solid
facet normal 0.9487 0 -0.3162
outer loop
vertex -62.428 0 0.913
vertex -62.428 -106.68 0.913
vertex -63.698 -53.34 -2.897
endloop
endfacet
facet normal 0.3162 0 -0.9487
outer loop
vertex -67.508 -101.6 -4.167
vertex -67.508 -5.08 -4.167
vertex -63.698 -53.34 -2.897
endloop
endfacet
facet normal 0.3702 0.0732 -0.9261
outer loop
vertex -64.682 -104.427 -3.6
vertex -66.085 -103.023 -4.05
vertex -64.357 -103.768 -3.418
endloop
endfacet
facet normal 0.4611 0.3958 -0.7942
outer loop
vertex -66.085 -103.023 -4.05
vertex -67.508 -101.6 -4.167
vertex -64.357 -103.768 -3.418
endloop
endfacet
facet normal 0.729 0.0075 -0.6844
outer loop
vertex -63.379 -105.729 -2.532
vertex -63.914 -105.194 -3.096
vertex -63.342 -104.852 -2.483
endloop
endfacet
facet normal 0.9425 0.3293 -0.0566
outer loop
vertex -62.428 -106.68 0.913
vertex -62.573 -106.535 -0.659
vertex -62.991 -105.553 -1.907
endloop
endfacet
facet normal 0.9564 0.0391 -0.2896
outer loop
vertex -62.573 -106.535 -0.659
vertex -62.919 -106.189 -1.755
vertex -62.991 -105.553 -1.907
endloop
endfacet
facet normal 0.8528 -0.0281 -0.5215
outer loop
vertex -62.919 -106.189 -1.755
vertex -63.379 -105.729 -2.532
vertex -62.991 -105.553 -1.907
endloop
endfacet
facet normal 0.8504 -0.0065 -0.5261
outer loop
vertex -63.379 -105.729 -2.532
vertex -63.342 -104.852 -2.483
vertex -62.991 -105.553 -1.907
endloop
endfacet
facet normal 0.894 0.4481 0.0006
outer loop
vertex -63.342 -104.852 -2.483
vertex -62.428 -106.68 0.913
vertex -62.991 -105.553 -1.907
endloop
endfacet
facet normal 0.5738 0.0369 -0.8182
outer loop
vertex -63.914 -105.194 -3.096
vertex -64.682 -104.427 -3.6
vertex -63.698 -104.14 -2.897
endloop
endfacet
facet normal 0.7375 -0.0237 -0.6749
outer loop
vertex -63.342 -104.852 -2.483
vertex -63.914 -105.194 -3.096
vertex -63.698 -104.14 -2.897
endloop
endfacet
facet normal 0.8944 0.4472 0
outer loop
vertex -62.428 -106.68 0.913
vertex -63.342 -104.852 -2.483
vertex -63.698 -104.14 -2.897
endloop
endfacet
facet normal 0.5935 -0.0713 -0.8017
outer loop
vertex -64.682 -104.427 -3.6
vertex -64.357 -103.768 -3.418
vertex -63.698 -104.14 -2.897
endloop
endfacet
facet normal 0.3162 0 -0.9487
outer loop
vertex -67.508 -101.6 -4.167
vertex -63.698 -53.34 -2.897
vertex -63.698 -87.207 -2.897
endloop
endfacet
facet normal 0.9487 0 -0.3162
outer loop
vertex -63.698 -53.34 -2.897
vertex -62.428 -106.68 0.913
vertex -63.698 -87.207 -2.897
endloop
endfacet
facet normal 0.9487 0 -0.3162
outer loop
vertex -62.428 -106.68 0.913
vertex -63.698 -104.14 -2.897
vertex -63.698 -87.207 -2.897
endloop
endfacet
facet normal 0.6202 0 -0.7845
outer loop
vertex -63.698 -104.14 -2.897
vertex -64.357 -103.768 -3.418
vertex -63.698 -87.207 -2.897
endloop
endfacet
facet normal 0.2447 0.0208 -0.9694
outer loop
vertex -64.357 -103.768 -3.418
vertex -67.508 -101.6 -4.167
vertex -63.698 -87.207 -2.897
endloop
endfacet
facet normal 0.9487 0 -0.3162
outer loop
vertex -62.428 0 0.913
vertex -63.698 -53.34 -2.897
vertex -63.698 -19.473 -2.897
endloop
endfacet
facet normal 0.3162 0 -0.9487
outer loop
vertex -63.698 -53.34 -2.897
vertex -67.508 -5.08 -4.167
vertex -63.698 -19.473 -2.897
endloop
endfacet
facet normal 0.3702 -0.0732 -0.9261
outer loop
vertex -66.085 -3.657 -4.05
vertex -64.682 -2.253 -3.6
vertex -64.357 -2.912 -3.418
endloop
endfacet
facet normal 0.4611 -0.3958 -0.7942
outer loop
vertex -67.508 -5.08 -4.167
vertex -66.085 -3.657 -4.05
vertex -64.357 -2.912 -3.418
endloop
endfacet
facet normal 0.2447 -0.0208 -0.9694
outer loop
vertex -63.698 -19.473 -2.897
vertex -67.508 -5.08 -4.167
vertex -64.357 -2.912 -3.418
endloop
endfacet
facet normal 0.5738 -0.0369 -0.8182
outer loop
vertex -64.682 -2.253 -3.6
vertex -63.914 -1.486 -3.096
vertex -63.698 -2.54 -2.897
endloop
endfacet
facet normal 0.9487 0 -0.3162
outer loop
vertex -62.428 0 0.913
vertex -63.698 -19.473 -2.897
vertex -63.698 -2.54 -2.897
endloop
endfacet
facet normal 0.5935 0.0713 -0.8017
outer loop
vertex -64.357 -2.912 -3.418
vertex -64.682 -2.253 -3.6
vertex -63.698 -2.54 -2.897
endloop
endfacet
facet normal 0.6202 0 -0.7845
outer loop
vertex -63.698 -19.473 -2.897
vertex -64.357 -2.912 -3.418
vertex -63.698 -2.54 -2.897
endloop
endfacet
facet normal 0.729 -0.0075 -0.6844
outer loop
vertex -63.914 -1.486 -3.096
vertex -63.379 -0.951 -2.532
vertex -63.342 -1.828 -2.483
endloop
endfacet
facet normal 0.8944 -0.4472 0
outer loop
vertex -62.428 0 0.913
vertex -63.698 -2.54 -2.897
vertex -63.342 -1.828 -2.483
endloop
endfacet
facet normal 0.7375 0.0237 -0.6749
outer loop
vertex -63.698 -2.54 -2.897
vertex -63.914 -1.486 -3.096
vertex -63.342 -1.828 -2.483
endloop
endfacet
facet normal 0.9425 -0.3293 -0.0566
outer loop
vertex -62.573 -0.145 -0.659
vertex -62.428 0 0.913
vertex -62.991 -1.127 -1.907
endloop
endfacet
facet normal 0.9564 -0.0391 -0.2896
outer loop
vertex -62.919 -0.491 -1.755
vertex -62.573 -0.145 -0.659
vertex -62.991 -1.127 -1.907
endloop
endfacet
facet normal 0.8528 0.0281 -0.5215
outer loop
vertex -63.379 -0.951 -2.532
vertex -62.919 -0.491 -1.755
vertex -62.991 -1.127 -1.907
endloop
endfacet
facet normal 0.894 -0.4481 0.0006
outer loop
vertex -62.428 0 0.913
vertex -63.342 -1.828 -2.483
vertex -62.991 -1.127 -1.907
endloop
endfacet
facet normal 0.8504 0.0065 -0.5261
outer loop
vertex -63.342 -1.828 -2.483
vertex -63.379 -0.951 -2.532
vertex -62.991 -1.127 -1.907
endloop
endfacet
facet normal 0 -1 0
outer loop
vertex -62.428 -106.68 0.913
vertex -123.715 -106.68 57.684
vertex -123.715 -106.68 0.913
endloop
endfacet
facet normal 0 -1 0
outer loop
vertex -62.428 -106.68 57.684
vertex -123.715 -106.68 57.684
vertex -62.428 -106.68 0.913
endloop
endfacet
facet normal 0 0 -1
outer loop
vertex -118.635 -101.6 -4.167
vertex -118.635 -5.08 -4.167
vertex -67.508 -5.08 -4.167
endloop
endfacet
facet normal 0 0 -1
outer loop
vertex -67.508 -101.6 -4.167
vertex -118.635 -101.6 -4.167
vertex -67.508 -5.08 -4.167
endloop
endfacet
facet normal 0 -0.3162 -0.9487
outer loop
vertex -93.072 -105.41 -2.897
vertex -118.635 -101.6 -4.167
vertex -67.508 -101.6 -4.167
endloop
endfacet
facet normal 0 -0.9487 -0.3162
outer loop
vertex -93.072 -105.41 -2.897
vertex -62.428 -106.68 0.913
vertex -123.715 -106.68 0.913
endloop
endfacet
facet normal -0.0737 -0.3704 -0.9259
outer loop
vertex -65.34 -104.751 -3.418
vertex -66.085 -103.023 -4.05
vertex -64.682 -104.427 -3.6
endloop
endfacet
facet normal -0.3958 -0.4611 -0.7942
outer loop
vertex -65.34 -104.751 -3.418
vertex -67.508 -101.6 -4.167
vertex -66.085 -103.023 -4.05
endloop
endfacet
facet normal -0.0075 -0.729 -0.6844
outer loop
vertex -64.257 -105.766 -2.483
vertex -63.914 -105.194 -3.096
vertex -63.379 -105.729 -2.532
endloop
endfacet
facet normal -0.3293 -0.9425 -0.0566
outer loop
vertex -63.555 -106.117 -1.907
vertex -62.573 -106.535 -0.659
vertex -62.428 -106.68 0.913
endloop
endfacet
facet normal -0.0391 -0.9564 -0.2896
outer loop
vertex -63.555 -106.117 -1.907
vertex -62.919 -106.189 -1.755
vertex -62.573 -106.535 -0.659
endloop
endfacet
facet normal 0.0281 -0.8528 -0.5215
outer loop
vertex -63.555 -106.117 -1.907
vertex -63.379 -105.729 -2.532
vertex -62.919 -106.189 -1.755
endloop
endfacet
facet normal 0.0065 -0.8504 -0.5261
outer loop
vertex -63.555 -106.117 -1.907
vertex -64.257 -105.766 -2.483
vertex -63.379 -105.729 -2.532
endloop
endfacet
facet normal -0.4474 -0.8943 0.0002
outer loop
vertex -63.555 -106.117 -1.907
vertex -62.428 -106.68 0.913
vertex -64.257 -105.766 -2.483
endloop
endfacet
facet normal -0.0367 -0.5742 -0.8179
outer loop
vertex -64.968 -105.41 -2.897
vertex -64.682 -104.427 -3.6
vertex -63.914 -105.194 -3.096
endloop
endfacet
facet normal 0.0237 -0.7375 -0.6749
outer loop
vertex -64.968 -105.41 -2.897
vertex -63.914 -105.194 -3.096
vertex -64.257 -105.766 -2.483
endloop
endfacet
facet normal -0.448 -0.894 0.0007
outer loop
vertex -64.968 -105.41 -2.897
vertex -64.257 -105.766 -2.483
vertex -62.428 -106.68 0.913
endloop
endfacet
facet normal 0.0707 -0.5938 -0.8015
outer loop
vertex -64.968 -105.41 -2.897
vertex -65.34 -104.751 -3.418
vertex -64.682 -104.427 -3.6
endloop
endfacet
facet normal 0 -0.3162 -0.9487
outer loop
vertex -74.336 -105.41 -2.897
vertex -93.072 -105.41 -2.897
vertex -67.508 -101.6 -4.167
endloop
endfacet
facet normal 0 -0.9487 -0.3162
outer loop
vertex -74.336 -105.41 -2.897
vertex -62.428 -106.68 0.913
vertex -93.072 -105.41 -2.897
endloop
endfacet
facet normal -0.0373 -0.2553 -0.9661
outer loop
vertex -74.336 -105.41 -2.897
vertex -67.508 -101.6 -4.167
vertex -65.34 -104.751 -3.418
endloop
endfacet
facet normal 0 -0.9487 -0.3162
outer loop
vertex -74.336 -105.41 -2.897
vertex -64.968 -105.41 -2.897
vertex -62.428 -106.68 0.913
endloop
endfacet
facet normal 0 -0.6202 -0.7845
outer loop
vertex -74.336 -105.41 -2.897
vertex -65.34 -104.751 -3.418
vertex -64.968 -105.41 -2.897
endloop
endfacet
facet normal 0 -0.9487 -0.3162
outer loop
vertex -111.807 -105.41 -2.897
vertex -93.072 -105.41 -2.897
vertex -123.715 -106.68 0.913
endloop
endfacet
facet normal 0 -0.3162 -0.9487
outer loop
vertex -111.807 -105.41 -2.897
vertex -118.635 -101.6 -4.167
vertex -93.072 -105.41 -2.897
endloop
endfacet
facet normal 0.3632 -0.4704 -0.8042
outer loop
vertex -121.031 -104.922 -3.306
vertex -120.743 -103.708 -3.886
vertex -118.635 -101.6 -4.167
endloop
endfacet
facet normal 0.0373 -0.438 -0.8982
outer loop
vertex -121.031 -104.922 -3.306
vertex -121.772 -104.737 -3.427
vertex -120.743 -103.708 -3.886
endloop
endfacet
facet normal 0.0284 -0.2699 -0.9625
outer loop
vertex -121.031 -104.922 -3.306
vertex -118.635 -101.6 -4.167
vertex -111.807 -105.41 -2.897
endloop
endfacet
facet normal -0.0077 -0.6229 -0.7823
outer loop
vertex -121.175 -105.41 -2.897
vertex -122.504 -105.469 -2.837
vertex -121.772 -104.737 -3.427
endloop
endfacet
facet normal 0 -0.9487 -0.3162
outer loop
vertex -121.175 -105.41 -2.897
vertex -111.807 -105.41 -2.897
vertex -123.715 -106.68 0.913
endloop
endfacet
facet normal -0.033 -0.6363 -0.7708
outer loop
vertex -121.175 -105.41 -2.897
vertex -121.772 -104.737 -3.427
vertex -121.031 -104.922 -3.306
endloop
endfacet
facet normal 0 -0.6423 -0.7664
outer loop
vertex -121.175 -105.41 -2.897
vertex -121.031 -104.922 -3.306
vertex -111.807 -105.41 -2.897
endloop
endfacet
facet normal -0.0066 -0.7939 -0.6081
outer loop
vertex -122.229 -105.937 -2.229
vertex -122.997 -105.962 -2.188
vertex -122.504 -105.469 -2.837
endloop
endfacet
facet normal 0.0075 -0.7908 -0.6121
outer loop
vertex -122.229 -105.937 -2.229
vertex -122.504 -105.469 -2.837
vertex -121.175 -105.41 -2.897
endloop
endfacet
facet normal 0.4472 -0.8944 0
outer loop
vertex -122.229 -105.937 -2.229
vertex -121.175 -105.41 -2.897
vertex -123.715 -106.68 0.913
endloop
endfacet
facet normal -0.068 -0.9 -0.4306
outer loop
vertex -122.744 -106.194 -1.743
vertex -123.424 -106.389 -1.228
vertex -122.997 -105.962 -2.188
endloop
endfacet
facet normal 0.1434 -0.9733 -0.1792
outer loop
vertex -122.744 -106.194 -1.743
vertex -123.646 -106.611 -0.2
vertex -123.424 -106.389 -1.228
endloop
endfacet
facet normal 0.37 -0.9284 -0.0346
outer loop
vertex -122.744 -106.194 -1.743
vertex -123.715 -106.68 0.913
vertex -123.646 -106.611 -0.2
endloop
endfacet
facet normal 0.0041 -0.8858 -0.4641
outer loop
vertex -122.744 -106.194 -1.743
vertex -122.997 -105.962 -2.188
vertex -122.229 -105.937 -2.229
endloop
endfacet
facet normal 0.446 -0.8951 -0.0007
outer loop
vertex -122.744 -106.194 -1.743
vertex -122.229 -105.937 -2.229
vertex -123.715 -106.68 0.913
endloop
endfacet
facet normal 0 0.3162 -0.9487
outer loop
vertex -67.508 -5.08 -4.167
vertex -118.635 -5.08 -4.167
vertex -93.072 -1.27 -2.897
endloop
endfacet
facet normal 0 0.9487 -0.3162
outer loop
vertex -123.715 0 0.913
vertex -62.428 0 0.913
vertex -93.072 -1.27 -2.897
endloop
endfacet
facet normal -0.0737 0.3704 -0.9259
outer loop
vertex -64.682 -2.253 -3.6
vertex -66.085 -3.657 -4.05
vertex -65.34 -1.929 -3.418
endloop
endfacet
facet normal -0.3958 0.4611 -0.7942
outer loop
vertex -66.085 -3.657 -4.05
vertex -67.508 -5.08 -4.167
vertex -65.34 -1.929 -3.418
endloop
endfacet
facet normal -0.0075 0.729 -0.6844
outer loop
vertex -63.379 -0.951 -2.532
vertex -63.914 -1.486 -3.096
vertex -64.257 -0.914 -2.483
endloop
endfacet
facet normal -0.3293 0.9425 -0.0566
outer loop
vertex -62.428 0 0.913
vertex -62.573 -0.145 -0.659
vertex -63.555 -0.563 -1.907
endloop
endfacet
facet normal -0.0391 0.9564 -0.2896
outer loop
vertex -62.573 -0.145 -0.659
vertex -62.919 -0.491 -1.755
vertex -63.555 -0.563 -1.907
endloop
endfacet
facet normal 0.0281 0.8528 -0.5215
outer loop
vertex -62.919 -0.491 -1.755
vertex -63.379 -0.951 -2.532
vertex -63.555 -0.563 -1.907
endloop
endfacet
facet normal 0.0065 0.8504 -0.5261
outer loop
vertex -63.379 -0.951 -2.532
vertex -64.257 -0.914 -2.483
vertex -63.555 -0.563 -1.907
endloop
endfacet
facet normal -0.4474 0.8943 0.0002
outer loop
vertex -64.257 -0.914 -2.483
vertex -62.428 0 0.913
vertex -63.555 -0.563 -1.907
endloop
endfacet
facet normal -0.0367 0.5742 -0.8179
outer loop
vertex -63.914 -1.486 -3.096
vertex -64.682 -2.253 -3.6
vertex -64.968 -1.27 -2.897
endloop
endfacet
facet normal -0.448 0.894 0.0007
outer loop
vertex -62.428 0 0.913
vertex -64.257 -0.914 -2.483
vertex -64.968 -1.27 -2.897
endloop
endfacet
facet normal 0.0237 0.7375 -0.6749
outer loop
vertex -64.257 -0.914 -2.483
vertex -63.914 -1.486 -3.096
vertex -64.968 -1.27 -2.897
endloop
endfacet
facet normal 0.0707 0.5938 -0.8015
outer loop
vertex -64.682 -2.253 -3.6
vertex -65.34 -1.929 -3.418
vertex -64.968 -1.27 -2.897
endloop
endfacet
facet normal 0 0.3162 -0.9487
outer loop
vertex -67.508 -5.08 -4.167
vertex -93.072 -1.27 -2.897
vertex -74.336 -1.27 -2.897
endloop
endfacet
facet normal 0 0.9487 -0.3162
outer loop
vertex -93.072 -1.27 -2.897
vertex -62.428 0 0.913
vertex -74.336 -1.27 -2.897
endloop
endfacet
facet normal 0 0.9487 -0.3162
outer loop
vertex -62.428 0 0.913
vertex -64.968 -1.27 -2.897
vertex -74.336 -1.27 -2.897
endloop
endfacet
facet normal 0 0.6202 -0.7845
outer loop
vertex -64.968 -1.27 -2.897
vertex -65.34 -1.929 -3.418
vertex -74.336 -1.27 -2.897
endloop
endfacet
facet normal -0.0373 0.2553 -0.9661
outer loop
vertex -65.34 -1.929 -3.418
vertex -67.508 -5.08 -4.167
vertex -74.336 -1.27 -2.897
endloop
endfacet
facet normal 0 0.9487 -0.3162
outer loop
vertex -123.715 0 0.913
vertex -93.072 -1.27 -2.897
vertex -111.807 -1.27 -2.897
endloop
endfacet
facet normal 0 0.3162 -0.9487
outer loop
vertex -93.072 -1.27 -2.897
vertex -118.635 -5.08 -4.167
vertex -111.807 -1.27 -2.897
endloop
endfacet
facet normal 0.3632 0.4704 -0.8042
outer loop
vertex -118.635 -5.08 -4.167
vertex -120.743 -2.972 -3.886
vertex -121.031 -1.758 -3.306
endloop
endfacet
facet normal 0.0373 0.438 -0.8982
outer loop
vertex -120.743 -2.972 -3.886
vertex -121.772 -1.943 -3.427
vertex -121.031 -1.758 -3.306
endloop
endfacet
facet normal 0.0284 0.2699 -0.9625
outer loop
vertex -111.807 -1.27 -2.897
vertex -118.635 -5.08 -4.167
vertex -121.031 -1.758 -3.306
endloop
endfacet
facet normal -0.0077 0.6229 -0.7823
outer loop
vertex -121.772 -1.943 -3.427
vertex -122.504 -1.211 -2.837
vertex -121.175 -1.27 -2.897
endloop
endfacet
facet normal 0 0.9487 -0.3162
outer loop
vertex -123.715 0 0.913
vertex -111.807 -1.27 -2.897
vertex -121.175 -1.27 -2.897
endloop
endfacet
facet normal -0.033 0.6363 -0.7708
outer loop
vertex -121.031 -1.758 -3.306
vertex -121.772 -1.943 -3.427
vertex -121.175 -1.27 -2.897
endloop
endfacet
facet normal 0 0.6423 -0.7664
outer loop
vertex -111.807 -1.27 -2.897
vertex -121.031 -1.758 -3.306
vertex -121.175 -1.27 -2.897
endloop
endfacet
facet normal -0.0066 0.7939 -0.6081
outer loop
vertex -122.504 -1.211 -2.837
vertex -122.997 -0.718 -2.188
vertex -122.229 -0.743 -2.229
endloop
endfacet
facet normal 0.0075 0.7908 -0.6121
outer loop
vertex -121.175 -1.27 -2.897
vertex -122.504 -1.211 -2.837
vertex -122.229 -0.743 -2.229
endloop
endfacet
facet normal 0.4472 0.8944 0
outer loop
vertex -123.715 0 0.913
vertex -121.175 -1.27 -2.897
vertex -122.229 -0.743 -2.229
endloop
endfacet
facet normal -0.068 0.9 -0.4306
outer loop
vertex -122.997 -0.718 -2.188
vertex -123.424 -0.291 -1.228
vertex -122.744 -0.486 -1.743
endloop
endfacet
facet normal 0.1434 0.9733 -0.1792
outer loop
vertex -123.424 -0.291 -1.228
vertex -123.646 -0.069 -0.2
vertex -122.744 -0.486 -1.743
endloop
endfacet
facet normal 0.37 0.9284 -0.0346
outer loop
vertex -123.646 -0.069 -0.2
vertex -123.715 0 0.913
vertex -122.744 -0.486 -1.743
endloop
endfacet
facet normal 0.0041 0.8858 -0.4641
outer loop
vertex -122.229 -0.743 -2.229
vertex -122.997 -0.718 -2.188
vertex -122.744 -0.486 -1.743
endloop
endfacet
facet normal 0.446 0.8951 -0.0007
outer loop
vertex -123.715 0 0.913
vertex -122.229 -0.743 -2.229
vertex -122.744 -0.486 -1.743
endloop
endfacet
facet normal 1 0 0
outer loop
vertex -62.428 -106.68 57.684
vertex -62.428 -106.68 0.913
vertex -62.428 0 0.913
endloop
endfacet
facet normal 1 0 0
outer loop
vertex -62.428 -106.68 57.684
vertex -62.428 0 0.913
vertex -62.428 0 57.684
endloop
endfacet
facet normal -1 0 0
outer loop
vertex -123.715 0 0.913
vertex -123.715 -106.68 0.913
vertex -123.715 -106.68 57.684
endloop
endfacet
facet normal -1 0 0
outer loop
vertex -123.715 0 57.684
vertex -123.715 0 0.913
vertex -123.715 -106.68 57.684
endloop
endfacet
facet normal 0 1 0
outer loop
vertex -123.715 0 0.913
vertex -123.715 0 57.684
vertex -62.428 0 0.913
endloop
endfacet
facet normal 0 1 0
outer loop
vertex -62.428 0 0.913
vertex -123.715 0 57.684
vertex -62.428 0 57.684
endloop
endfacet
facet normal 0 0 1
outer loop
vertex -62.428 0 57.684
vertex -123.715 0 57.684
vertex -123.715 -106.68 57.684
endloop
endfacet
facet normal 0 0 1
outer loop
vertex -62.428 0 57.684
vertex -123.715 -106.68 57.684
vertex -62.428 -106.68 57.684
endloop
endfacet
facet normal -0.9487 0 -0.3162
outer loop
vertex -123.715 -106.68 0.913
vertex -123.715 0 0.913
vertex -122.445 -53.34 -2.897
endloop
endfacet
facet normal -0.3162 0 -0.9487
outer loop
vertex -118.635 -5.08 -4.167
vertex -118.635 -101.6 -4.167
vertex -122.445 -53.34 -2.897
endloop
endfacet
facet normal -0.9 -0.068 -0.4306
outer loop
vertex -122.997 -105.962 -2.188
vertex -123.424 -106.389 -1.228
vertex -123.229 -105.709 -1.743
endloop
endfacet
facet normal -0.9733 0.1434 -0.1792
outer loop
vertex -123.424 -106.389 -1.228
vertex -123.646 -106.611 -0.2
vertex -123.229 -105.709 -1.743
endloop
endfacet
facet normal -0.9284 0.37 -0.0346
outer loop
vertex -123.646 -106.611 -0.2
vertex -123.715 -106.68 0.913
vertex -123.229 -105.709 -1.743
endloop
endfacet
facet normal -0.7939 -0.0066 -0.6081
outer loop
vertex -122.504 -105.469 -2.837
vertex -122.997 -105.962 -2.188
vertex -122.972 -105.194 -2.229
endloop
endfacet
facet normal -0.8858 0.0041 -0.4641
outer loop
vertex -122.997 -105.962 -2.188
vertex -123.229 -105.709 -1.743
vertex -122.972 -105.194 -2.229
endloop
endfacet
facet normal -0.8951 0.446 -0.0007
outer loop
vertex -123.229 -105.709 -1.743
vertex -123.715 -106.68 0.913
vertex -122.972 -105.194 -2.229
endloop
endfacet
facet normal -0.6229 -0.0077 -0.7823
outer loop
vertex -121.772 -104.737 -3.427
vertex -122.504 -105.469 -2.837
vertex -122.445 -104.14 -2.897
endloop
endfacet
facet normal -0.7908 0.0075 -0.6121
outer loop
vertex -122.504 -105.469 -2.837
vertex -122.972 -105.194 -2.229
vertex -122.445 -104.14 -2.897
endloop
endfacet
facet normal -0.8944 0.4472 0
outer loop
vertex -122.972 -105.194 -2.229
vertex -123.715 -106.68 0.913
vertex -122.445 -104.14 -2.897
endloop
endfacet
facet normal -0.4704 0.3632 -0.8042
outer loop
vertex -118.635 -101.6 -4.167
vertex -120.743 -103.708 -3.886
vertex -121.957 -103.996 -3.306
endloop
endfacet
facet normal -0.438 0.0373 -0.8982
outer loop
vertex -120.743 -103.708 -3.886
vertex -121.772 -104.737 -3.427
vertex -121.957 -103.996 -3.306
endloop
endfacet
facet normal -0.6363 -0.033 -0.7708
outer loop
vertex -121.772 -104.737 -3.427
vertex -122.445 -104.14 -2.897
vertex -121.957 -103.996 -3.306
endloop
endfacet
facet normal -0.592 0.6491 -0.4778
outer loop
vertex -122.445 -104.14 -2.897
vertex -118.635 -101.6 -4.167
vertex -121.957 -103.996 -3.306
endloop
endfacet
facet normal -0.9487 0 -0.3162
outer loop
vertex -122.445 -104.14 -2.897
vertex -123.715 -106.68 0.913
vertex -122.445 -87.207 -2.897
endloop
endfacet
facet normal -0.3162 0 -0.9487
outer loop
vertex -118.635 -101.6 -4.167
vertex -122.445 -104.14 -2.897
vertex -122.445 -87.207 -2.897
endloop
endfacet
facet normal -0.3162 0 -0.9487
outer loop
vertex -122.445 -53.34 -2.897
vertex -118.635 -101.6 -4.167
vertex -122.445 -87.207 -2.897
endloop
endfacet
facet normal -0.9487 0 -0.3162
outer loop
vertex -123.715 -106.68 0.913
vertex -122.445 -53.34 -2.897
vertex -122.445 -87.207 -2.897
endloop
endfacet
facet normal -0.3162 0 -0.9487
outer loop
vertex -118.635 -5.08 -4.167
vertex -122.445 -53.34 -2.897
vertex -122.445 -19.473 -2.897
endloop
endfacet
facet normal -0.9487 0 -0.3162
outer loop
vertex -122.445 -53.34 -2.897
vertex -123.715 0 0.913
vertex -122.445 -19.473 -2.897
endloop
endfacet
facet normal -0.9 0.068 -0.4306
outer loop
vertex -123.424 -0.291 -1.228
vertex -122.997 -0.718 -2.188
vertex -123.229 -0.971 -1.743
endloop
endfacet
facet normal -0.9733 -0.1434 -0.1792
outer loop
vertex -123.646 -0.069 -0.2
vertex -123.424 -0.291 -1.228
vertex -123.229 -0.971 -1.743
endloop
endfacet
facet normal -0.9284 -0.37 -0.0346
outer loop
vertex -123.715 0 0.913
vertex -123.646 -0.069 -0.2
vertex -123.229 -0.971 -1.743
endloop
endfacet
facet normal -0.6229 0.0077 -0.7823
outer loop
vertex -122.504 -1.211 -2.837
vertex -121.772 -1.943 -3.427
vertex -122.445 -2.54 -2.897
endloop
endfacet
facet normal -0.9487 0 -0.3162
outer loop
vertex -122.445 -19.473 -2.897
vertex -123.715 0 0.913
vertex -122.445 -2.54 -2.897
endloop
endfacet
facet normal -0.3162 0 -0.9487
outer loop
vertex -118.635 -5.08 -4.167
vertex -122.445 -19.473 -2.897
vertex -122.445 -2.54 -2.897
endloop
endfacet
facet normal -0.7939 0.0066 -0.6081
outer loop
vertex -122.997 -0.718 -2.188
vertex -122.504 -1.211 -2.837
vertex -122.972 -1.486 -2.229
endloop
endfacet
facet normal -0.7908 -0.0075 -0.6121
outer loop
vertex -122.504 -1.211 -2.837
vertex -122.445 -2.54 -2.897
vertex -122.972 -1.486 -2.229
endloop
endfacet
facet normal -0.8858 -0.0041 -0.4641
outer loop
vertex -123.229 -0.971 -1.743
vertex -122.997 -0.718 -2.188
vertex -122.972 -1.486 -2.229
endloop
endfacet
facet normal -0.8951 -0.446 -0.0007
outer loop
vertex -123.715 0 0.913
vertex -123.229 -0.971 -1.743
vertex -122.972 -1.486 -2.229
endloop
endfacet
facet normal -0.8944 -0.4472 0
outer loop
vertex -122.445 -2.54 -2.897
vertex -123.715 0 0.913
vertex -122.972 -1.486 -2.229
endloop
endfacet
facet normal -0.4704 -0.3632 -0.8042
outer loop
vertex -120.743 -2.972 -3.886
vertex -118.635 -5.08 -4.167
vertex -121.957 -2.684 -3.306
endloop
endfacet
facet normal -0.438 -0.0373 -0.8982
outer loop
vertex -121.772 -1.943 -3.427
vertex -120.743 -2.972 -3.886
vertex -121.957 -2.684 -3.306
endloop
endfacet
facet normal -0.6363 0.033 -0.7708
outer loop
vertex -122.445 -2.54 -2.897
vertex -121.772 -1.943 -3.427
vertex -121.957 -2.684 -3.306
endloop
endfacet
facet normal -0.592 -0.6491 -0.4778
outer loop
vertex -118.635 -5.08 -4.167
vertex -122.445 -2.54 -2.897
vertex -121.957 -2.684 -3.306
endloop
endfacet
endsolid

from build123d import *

# Parameters (mm, degrees)
F0_W        = 61.2871013582
F0_H        = 61.8507722393
F1_DEPTH    = 106.68
F2_T1_DEPTH = 132.08
F2_T3_DEPTH = 86.6871013582


# Not quite as in the source:
# - a fillet or chamfer that OpenCascade refuses, or shapes differently, is made with other operations: its cross-section is extruded or revolved along the edge and cut away or added


with BuildPart() as f1:
    # F0 (on Front) → F1 (new body)
    with BuildSketch(Plane.XZ):
        with Locations((-93.0716339499, 26.758744847)):
            Rectangle(F0_W, F0_H)
    extrude(amount=F1_DEPTH)

    # F2: fillet of radius 5.08 on 4 edges, made by hand

    # F2_s2 → F2_t1 (cut)
    with BuildSketch(Plane.XZ.offset(-12.7)):
        with BuildLine():
            add(Edge.make_bspline(
                [(-123.715184629, 0.9133587274), (-123.715184629, -4.1666412726), (-118.635184629, -4.1666412726)],
                knots=[0, 0, 0, 1, 1, 1], degree=2, weights=[1, 1, 1]))
            Line((-118.635184629, -4.1666412726), (-123.715184629, -4.1666412726))
            Line((-123.715184629, -4.1666412726), (-123.715184629, 0.9133587274))
        make_face()
        with BuildLine():
            add(Edge.make_bspline(
                [(-67.5080832708, -4.1666412726), (-62.4280832708, -4.1666412726), (-62.4280832708, 0.9133587274)],
                knots=[0, 0, 0, 1, 1, 1], degree=2, weights=[1, 1, 1]))
            Line((-62.4280832708, 0.9133587274), (-62.4280832708, -4.1666412726))
            Line((-62.4280832708, -4.1666412726), (-67.5080832708, -4.1666412726))
        make_face()
    extrude(amount=F2_T1_DEPTH, mode=Mode.SUBTRACT)

    # F2_s4 → F2_t3 (cut)
    with BuildSketch(Plane.YZ.offset(-136.415184629)):
        with BuildLine():
            add(Edge.make_bspline(
                [(-101.6, -4.1666412726), (-106.68, -4.1666412726), (-106.68, 0.9133587274)],
                knots=[0, 0, 0, 1, 1, 1], degree=2, weights=[1, 1, 1]))
            Line((-106.68, 0.9133587274), (-106.68, -4.1666412726))
            Line((-106.68, -4.1666412726), (-101.6, -4.1666412726))
        make_face()
        with BuildLine():
            add(Edge.make_bspline(
                [(-5.08, -4.1666412726), (0, -4.1666412726), (0, 0.9133587274)],
                knots=[0, 0, 0, 1, 1, 1], degree=2, weights=[1, 1, 1]))
            Line((0, 0.9133587274), (0, -4.1666412726))
            Line((0, -4.1666412726), (-5.08, -4.1666412726))
        make_face()
    extrude(amount=F2_T3_DEPTH, mode=Mode.SUBTRACT)


solid = f1.part
